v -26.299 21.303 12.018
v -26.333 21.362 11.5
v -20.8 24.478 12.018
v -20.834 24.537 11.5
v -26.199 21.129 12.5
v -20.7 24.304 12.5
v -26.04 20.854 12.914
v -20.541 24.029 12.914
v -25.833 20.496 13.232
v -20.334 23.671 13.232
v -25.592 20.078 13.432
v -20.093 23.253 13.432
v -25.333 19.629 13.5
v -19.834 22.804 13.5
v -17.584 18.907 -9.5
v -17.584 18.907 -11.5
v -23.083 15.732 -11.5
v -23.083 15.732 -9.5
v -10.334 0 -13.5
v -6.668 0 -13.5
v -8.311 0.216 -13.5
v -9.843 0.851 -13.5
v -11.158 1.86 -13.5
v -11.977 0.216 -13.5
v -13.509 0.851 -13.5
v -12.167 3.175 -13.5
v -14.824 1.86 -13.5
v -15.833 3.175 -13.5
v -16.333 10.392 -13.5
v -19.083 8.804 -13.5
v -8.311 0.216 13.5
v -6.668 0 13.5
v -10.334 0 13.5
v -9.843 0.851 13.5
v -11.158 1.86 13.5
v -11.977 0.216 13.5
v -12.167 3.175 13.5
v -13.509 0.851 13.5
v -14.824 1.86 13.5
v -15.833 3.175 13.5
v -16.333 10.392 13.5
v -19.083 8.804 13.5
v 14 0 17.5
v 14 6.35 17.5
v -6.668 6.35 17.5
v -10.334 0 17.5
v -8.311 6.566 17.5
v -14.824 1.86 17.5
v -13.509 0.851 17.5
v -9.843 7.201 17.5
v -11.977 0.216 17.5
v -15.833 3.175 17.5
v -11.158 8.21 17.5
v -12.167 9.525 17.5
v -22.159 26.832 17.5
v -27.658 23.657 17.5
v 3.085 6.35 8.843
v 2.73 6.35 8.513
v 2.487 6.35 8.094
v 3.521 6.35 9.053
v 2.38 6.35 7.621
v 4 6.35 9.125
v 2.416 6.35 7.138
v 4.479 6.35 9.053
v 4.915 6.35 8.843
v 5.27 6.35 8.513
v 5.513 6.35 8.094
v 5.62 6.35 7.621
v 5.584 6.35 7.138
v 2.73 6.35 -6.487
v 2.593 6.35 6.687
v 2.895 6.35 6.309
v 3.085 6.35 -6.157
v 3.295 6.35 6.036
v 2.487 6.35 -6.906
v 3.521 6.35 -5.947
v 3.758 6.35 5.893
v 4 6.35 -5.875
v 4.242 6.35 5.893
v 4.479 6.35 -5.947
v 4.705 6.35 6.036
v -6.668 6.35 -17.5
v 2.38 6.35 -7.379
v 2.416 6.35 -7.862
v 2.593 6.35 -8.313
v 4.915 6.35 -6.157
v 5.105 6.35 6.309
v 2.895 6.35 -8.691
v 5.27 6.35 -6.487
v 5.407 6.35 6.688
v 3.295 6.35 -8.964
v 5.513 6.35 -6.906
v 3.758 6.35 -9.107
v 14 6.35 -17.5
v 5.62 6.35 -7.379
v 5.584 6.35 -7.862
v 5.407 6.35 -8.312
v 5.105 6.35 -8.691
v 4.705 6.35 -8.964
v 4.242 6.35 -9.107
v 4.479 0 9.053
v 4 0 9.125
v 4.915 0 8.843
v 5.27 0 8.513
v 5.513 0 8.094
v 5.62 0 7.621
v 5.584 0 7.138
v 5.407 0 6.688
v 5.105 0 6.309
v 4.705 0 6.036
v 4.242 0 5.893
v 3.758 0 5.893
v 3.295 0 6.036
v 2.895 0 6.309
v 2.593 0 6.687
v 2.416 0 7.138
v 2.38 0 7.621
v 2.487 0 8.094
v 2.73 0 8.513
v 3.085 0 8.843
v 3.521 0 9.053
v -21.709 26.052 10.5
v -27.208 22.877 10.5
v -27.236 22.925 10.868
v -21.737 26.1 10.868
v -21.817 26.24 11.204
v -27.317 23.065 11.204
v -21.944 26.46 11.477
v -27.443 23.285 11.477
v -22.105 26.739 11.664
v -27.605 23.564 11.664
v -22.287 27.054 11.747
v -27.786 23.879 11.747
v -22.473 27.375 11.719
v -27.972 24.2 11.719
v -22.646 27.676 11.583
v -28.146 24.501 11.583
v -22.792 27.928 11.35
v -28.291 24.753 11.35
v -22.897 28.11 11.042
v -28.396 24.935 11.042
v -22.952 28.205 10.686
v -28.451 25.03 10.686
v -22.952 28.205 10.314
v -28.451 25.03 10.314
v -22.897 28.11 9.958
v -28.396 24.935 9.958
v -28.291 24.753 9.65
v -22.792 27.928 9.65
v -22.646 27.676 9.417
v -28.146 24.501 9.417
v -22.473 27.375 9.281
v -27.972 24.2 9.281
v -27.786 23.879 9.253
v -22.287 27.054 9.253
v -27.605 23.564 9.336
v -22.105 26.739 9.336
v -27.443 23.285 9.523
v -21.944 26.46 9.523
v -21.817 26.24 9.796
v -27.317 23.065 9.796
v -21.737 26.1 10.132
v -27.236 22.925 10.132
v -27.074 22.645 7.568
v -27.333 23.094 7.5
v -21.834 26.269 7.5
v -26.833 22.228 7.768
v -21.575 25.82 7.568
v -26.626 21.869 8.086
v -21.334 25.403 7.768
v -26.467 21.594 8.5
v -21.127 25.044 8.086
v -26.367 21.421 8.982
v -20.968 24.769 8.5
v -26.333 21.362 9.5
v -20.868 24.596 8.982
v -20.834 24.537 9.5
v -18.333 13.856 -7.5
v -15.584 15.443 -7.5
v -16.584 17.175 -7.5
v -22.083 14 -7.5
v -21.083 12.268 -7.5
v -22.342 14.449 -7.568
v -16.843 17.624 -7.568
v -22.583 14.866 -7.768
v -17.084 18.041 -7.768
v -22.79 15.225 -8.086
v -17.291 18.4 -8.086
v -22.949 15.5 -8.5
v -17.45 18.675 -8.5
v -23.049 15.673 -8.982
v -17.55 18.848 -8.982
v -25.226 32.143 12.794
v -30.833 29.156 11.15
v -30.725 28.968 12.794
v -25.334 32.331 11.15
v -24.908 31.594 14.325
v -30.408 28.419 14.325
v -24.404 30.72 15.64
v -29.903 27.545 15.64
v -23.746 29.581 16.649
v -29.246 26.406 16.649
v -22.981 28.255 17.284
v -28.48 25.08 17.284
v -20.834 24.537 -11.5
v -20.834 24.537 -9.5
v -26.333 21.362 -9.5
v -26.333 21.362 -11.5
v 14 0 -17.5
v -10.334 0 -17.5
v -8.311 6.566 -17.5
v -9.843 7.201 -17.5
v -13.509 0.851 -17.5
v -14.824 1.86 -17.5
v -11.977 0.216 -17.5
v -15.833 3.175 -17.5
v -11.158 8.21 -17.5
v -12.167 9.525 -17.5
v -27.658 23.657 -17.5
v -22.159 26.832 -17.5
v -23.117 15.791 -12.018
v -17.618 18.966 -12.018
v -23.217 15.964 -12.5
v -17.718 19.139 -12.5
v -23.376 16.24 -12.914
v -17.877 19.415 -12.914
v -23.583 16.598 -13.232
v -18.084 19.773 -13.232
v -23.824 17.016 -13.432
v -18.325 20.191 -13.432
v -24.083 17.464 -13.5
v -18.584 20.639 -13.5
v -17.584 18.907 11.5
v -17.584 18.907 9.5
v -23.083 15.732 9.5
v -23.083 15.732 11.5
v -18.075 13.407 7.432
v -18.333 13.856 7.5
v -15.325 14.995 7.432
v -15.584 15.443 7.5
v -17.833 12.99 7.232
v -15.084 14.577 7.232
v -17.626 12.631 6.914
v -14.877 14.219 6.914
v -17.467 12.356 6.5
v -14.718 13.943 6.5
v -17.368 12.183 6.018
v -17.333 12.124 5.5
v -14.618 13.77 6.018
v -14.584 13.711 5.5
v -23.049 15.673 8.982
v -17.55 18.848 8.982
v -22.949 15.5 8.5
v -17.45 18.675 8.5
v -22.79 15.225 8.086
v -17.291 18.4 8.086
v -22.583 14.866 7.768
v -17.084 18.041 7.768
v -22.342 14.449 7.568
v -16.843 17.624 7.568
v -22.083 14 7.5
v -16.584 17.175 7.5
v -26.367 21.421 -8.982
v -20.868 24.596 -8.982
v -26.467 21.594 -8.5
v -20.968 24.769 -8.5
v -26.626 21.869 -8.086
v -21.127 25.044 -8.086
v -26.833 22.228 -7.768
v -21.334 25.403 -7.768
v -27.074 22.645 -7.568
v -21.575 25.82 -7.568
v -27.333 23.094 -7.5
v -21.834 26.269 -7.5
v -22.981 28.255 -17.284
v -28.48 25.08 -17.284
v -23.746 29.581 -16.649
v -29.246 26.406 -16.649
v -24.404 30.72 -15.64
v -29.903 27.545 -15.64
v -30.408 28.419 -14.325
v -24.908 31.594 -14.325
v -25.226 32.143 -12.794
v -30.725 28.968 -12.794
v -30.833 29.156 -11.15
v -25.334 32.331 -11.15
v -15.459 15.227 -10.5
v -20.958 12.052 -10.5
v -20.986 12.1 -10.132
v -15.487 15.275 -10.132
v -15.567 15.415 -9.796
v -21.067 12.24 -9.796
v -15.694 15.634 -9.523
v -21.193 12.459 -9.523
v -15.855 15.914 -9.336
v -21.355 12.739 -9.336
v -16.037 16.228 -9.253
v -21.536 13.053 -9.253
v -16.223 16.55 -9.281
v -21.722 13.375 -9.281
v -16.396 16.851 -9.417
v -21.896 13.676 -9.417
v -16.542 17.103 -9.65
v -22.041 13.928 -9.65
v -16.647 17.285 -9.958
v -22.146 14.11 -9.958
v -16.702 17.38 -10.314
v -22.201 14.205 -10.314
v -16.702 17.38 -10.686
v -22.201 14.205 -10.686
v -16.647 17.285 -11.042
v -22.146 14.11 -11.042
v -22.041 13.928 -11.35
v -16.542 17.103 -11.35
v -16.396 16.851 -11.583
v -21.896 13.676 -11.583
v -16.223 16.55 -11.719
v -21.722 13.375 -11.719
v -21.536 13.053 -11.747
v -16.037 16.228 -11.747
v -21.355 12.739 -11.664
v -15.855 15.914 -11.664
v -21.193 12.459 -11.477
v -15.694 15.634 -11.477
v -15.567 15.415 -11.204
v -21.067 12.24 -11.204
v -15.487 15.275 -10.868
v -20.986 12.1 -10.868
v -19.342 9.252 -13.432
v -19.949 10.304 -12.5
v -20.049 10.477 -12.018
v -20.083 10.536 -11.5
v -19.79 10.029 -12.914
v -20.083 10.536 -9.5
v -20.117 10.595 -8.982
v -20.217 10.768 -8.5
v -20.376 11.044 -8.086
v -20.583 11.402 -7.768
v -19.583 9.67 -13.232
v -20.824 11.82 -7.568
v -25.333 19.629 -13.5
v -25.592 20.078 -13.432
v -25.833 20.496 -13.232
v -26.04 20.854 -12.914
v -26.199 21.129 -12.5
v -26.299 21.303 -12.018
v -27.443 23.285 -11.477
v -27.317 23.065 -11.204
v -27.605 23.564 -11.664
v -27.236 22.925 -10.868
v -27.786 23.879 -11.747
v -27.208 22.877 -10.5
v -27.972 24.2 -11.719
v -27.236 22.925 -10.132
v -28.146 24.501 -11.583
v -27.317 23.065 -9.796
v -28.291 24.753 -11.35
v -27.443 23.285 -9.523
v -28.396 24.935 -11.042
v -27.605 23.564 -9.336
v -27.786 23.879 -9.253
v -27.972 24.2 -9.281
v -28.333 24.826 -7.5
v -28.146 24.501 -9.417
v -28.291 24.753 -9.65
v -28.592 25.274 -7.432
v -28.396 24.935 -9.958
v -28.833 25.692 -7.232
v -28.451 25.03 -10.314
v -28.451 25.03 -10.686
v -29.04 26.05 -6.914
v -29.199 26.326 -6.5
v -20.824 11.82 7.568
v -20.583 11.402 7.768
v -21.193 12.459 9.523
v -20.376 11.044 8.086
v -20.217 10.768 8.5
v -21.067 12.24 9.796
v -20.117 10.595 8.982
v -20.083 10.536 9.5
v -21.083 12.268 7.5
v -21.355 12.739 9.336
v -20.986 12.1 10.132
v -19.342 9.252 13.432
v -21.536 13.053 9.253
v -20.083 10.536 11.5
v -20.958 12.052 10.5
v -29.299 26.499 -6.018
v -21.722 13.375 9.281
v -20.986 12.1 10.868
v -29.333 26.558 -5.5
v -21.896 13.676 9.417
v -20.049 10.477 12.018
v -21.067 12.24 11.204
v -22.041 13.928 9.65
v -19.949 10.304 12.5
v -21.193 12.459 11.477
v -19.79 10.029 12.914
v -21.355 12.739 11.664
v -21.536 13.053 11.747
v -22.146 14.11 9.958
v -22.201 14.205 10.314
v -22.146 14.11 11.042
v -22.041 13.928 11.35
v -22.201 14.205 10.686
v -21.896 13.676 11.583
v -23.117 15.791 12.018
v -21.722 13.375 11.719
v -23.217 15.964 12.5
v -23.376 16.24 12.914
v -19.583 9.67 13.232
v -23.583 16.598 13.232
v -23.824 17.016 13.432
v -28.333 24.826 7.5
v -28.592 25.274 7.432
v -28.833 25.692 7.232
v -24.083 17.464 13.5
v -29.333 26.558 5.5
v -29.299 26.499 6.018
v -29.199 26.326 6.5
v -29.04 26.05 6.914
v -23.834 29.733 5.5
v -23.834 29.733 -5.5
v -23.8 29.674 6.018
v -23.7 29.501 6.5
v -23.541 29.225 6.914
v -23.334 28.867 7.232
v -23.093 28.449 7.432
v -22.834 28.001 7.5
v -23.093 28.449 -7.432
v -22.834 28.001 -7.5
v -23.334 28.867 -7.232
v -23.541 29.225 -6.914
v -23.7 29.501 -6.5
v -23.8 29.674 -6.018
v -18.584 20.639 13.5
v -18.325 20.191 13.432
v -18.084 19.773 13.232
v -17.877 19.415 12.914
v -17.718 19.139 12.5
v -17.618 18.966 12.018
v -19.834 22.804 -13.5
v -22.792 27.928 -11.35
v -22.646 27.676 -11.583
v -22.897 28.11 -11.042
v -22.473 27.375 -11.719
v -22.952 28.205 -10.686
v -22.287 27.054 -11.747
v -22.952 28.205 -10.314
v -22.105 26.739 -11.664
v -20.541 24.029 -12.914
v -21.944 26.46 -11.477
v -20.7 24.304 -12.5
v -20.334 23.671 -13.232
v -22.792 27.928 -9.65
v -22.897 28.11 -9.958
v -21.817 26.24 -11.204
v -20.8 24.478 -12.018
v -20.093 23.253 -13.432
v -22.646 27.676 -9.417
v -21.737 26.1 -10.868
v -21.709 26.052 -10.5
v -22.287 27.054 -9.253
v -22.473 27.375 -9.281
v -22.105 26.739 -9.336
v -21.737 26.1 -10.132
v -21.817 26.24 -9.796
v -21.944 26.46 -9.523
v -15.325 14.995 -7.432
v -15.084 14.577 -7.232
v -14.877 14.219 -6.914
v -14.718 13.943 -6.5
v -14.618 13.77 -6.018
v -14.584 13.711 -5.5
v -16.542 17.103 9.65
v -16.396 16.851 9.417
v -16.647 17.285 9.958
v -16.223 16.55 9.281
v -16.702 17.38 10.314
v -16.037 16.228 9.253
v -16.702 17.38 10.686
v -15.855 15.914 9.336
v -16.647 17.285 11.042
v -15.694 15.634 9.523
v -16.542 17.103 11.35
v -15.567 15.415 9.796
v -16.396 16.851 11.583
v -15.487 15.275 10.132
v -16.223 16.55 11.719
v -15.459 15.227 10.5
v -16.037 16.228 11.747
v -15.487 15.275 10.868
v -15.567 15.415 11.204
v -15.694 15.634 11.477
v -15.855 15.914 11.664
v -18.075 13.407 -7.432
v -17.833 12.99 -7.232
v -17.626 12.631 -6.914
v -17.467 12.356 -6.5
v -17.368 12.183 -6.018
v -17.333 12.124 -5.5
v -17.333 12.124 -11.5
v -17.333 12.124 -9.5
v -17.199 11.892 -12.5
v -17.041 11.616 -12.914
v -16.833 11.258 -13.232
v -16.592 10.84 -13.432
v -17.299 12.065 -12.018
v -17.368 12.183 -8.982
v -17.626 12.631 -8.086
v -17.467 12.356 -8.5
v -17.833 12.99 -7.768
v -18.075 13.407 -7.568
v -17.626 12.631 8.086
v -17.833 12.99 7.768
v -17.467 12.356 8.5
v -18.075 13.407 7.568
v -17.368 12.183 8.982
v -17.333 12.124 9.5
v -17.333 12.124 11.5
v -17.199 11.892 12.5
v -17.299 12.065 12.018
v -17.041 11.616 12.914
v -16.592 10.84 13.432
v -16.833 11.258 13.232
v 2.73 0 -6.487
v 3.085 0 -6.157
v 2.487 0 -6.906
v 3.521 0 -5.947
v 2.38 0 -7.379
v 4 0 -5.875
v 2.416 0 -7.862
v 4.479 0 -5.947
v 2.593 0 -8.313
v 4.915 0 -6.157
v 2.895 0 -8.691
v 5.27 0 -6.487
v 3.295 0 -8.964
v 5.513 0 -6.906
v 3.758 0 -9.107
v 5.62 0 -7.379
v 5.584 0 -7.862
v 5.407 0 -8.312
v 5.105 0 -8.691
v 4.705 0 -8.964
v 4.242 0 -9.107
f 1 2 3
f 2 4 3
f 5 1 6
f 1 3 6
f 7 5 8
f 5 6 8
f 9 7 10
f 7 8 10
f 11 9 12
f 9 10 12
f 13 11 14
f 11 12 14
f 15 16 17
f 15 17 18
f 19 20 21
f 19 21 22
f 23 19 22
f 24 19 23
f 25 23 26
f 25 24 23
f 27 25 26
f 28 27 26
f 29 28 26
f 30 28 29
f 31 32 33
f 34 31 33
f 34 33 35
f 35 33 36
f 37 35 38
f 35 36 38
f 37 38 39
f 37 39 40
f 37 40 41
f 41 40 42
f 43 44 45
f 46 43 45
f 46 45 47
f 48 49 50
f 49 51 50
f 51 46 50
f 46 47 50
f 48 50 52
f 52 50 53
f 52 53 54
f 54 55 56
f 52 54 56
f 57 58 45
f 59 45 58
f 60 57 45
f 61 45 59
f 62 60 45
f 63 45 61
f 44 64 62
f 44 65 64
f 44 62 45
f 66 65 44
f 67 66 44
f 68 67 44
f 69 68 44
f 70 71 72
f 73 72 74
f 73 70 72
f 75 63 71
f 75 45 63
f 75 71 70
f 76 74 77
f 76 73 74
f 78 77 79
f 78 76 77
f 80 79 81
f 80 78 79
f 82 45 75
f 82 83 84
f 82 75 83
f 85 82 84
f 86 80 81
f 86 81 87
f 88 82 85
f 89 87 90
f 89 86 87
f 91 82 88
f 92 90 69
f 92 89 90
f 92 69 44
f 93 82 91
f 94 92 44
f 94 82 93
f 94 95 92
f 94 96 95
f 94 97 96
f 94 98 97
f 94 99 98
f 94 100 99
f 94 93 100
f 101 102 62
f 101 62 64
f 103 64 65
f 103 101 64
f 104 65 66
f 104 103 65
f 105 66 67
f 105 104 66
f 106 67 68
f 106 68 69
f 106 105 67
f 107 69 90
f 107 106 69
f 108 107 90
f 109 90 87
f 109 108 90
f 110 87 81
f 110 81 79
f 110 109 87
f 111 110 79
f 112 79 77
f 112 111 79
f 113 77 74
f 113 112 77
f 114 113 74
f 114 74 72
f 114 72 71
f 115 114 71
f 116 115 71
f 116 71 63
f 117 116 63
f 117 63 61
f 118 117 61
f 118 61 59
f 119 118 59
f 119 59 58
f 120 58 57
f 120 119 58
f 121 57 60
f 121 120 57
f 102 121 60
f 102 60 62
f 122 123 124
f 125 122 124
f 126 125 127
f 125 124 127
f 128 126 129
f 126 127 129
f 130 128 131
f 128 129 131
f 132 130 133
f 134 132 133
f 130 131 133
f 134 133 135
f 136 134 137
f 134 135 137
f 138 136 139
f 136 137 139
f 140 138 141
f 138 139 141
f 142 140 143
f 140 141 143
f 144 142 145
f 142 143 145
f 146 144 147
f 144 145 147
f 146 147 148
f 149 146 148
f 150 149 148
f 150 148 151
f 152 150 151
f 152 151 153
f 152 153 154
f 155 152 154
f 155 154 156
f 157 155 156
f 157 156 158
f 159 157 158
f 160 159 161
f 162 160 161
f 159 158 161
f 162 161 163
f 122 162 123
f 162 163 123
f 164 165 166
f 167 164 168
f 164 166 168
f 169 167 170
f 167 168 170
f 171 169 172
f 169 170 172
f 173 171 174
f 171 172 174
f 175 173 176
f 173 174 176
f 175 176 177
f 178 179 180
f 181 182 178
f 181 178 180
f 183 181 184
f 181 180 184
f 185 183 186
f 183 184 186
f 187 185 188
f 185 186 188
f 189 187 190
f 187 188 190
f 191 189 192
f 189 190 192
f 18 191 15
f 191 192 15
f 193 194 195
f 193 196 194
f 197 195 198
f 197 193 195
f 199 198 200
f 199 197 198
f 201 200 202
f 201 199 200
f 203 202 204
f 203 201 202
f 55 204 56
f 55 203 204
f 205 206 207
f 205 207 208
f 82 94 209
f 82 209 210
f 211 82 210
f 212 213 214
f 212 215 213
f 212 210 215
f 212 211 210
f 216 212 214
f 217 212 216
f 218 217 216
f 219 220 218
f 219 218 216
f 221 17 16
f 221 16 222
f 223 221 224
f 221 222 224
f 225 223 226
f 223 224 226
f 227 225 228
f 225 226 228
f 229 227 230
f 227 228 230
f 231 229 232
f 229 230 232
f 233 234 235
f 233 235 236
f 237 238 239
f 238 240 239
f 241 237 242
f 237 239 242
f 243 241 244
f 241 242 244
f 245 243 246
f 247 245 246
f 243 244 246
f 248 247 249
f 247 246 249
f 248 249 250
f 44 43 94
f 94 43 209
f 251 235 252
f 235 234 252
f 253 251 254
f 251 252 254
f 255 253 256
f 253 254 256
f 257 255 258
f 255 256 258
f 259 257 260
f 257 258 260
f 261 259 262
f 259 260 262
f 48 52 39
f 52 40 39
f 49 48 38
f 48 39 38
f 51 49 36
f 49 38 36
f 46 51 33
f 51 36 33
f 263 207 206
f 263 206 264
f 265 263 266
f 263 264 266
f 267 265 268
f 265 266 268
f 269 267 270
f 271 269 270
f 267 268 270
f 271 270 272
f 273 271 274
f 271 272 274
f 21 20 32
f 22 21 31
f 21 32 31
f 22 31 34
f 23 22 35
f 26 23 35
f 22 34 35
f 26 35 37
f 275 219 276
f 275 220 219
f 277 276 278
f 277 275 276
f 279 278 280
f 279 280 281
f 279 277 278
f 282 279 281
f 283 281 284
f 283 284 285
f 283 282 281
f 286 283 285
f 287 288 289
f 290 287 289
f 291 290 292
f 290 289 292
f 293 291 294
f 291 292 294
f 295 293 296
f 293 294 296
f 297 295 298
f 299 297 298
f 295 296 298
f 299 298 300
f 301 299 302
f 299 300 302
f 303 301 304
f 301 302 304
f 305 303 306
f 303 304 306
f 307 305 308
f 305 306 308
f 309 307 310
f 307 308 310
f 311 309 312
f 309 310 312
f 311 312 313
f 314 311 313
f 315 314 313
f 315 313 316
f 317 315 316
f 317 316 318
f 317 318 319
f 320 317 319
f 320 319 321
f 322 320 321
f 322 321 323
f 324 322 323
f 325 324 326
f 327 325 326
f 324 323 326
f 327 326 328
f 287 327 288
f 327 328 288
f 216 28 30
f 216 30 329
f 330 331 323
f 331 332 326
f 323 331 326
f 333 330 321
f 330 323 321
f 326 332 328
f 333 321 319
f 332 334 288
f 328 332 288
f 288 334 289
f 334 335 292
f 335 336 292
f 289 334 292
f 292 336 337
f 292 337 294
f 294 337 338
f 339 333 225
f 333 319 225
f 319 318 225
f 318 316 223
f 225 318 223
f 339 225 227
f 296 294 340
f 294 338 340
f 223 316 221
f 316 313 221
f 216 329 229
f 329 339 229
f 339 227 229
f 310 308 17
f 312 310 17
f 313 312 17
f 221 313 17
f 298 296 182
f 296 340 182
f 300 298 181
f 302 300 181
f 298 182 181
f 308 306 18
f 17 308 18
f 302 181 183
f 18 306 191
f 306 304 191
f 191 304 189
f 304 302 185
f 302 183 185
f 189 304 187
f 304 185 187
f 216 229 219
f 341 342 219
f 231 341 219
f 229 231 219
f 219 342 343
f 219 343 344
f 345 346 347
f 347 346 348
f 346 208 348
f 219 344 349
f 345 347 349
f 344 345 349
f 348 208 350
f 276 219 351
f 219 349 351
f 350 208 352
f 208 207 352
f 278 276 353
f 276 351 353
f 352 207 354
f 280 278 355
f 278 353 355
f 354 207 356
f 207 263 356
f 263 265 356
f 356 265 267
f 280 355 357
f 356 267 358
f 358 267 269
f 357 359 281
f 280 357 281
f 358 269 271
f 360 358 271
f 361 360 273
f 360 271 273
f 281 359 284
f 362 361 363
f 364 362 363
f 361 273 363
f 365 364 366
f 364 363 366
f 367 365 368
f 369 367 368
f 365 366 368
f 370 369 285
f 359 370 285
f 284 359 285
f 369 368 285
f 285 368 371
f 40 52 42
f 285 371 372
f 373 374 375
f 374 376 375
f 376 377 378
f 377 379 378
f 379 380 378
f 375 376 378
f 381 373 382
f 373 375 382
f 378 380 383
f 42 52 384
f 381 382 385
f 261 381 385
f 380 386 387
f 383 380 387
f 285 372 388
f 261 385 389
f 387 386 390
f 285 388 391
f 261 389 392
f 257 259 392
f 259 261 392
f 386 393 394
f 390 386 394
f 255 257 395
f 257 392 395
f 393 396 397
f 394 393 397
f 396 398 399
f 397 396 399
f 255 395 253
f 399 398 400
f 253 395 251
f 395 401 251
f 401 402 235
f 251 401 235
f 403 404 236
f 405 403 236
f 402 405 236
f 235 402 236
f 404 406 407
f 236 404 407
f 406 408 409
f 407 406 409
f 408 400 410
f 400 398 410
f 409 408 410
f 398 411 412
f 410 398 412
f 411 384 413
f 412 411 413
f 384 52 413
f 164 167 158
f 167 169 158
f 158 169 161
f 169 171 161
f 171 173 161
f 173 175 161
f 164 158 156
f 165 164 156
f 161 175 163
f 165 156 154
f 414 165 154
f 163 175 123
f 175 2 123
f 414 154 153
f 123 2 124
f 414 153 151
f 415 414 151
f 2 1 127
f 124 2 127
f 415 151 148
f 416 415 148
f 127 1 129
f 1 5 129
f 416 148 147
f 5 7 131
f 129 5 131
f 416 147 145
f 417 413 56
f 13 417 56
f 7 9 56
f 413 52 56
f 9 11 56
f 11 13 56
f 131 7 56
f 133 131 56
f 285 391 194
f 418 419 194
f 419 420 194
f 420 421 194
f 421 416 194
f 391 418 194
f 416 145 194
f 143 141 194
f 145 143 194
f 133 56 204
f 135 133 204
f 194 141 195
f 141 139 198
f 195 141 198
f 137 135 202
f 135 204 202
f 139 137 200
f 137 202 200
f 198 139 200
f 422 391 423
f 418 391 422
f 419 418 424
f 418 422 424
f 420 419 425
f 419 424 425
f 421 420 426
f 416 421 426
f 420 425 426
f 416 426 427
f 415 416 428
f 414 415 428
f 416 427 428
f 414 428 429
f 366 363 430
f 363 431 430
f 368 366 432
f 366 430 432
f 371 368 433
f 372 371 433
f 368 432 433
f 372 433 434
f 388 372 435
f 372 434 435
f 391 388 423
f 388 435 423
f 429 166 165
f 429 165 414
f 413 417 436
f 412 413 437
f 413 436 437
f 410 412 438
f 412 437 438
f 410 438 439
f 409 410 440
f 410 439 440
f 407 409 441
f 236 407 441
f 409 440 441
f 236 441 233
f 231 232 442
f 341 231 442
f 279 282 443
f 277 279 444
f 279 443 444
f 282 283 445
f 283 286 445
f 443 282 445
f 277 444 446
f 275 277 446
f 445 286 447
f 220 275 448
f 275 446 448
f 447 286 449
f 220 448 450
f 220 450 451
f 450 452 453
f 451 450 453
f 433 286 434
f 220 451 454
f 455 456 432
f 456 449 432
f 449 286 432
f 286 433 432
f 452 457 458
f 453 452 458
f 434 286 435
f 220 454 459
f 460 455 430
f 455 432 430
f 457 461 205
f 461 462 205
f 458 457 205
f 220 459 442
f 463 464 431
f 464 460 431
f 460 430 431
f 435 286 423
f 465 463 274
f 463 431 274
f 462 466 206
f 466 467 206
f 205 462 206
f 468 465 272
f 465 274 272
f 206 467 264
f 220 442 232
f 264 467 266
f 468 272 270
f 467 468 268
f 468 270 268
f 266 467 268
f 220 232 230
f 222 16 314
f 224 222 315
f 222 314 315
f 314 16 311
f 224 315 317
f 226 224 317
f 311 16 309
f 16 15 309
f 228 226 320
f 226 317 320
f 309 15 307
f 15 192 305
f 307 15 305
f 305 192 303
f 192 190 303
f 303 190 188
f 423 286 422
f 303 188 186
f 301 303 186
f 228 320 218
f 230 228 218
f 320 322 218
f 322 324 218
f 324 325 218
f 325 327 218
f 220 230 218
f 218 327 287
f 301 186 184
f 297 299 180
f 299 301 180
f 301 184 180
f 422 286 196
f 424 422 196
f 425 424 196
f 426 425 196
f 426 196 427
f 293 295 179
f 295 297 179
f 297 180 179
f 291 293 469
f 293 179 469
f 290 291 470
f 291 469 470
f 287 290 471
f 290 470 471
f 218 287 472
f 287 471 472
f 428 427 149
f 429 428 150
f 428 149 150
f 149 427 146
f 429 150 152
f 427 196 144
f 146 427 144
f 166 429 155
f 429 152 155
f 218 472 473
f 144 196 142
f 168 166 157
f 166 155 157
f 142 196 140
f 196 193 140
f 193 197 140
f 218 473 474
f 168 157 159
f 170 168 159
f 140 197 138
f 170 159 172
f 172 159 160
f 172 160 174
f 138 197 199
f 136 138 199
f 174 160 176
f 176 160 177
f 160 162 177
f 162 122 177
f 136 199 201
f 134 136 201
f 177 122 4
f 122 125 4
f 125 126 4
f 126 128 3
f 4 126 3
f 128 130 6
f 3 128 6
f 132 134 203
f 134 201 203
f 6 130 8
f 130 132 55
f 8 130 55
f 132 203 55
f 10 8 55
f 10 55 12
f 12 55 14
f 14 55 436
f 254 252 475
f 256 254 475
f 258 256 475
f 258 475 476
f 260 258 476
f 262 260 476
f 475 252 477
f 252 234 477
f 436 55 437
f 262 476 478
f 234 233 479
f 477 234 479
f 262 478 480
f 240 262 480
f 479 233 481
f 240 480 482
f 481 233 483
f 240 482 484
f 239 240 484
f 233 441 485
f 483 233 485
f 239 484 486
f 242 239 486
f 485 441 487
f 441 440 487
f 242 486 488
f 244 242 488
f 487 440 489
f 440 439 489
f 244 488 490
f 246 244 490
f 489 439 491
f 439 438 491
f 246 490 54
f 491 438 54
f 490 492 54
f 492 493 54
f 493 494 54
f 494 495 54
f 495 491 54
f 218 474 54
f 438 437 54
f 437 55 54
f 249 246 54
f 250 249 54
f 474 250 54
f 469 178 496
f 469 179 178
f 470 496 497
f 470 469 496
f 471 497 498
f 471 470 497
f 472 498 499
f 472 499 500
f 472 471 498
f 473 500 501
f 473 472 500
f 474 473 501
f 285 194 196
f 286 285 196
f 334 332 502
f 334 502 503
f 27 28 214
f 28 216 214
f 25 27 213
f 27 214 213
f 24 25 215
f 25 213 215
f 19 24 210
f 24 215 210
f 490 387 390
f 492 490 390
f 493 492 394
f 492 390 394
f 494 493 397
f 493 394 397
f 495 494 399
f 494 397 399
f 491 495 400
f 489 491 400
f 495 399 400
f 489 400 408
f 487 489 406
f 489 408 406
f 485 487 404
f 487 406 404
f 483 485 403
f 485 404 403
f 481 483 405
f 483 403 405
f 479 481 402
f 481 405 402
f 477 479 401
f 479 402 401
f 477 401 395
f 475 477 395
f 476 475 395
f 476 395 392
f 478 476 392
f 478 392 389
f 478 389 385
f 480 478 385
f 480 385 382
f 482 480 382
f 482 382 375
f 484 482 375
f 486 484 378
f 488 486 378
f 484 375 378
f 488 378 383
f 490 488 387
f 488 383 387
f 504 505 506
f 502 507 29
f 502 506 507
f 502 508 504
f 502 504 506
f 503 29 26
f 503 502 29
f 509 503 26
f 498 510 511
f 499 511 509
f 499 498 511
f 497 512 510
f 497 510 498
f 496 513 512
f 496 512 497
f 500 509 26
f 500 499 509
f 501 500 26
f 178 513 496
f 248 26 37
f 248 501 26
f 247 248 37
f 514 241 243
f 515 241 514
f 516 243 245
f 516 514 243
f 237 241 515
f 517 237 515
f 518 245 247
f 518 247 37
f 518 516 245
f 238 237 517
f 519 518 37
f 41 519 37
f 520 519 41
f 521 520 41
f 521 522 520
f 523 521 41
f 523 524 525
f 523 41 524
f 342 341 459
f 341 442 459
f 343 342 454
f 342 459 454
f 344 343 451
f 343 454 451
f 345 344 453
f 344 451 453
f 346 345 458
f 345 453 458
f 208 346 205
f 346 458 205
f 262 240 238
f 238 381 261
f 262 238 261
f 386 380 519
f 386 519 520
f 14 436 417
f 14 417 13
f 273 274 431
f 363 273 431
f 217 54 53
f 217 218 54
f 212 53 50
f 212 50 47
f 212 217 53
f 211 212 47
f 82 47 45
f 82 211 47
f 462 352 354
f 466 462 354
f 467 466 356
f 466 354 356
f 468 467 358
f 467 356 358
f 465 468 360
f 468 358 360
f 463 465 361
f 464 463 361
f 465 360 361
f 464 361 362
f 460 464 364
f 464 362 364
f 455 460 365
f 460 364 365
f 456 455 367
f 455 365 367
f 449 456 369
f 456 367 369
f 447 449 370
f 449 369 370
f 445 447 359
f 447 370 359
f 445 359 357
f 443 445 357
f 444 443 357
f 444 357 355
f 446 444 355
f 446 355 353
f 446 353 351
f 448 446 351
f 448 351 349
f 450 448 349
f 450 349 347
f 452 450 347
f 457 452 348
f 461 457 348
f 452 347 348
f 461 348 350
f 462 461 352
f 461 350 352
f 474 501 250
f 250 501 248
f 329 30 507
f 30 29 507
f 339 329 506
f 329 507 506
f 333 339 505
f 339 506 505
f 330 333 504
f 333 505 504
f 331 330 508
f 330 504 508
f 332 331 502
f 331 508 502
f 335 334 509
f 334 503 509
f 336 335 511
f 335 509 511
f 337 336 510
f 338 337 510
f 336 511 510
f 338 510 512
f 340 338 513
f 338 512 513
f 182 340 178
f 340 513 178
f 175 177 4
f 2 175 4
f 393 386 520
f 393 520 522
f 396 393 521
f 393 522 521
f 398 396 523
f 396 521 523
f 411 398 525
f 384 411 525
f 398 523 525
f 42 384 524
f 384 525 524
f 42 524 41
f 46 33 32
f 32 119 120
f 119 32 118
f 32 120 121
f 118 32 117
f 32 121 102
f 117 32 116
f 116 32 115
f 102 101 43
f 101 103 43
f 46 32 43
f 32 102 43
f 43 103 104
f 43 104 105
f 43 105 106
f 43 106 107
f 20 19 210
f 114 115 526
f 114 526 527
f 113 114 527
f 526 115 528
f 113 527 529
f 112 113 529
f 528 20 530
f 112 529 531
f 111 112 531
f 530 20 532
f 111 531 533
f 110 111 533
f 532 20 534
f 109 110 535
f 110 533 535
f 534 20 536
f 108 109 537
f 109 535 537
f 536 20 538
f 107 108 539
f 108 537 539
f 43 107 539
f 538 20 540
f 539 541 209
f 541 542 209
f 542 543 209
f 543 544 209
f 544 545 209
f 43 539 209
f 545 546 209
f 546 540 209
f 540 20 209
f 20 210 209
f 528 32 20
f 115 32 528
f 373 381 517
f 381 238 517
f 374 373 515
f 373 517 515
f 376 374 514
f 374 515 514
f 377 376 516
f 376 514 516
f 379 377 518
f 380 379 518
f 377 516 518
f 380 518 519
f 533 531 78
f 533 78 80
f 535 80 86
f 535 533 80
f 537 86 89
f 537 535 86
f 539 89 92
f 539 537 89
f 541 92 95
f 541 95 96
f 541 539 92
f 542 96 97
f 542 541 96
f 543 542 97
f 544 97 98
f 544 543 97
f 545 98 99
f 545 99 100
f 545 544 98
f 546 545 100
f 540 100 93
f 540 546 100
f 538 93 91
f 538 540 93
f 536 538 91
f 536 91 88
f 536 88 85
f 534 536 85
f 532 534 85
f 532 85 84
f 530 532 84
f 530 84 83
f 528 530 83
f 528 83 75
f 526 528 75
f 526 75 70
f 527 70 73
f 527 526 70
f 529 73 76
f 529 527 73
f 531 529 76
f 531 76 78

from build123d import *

# Parameters (mm, degrees)
SKETCH1_W           = 28
SKETCH1_H           = 35
SKETCH1_R           = 1.625
BOSS_EXTRUDE1_DEPTH = 6.35
BOSS_EXTRUDE2_DEPTH = 35
SKETCH3_W           = 6
SKETCH3_H           = 6.5
SKETCH3_W_2         = 15
SKETCH3_H_2         = 6
SKETCH3_R           = 1.25
CUT_EXTRUDE1_DEPTH  = 6.35
SKETCH4_W           = 27
SKETCH4_H           = 26.166174209
CUT_EXTRUDE2_DEPTH  = 3.175
FILLET1_R           = 2
FILLET2_R           = 6.35
FILLET3_R           = 2


with BuildPart() as part:
    # Sketch1 → Boss-Extrude1 (new body)
    with BuildSketch(Plane(origin=(0, 0, 0), x_dir=(1, 0, 0), z_dir=(0, 1, 0))):
        Rectangle(SKETCH1_W, SKETCH1_H)
        with Locations(Location((4, 7.5, 0), (0, 0, 270))):
            Circle(SKETCH1_R, mode=Mode.SUBTRACT)
        with Locations(Location((4, -7.5, 0), (0, 0, 270))):
            Circle(SKETCH1_R, mode=Mode.SUBTRACT)
    extrude(amount=BOSS_EXTRUDE1_DEPTH)

    # Sketch2 → Boss-Extrude2 (add)
    with BuildSketch(Plane.XY.offset(17.5)):
        Polygon((-14, 0), (-30.833087105, 29.155762114), (-25.333825791, 32.330762114), (-10.333825791, 6.35), align=None)
    extrude(amount=-BOSS_EXTRUDE2_DEPTH)

    # Sketch3 → Cut-Extrude1 (cut)
    with BuildSketch(Plane(origin=(-10.5, -6.062177826, 0), x_dir=(0, 0, 1), z_dir=(-0.8660254037844415, -0.4999999999999949, 0))):
        with Locations((-10.5, 28.416174209)):
            Rectangle(SKETCH3_W, SKETCH3_H)
        with Locations((0, 28.416174209)):
            Rectangle(SKETCH3_W_2, SKETCH3_H)
        with Locations((0, 34.666174209)):
            Rectangle(SKETCH3_W_2, SKETCH3_H_2)
        with Locations(Location((-10.5, 34.666174209, 0), (0, 0, 270))):
            Circle(SKETCH3_R)
        with Locations(Location((-10.5, 22.166174209, 0), (0, 0, 270))):
            Circle(SKETCH3_R)
        with Locations(Location((10.5, 22.166174209, 0), (0, 0, 270))):
            Circle(SKETCH3_R)
        with Locations(Location((10.5, 34.666174209, 0), (0, 0, 270))):
            Circle(SKETCH3_R)
        with Locations((10.5, 28.416174209)):
            Rectangle(SKETCH3_W, SKETCH3_H)
        with Locations((0, 22.166174209)):
            Rectangle(SKETCH3_W_2, SKETCH3_H_2)
    extrude(amount=-CUT_EXTRUDE1_DEPTH, mode=Mode.SUBTRACT)

    # Sketch4 → Cut-Extrude2 (cut)
    with BuildSketch(Plane(origin=(-10.5, -6.062177826, 0), x_dir=(0, 0, 1), z_dir=(-0.8660254037844417, -0.49999999999999484, 0))):
        with Locations((0, 6.083087105)):
            Rectangle(SKETCH4_W, SKETCH4_H)
    extrude(amount=-CUT_EXTRUDE2_DEPTH, mode=Mode.SUBTRACT)

    # Fillet1
    fillet1_edges = [part.edges().sort_by_distance(p)[0] for p in [
        (-18.708271776, 11.329965932, 7.5),
        (-18.708271776, 11.329965932, 13.5),
        (-18.708271776, 11.329965932, -13.5),
        (-20.333456448, 17.319868355, -7.5),
        (-20.333456448, 17.319868355, -13.5),
        (-23.583456448, 22.949033479, -13.5),
        (-23.583456448, 22.949033479, -7.5),
        (-26.583456448, 28.145185902, -7.5),
        (-26.583456448, 28.145185902, 7.5),
        (-23.583456448, 22.949033479, 7.5),
        (-23.583456448, 22.949033479, 13.5),
        (-20.333456448, 17.319868355, 13.5),
        (-20.333456448, 17.319868355, 7.5),
        (-18.708271776, 11.329965932, -7.5),
    ]]
    fillet(fillet1_edges, radius=FILLET1_R)

    # Fillet2
    fillet2_edges = [part.edges().sort_by_distance(p)[0] for p in [
        (-14, 0, 15.5),
        (-14, 0, -15.5),
        (-10.333825791, 6.35, 0),
        (-28.083456448, 30.743262114, 17.5),
        (-28.083456448, 30.743262114, -17.5),
        (-10.333825791, 0, 0),
    ]]
    fillet(fillet2_edges, radius=FILLET2_R)

    # Fillet3
    fillet3_edges = [part.edges().sort_by_distance(p)[0] for p in [
        (-15.958641119, 12.917465932, 7.5),
        (-15.958641119, 12.917465932, -7.5),
    ]]
    fillet(fillet3_edges, radius=FILLET3_R)


solid = part.part
